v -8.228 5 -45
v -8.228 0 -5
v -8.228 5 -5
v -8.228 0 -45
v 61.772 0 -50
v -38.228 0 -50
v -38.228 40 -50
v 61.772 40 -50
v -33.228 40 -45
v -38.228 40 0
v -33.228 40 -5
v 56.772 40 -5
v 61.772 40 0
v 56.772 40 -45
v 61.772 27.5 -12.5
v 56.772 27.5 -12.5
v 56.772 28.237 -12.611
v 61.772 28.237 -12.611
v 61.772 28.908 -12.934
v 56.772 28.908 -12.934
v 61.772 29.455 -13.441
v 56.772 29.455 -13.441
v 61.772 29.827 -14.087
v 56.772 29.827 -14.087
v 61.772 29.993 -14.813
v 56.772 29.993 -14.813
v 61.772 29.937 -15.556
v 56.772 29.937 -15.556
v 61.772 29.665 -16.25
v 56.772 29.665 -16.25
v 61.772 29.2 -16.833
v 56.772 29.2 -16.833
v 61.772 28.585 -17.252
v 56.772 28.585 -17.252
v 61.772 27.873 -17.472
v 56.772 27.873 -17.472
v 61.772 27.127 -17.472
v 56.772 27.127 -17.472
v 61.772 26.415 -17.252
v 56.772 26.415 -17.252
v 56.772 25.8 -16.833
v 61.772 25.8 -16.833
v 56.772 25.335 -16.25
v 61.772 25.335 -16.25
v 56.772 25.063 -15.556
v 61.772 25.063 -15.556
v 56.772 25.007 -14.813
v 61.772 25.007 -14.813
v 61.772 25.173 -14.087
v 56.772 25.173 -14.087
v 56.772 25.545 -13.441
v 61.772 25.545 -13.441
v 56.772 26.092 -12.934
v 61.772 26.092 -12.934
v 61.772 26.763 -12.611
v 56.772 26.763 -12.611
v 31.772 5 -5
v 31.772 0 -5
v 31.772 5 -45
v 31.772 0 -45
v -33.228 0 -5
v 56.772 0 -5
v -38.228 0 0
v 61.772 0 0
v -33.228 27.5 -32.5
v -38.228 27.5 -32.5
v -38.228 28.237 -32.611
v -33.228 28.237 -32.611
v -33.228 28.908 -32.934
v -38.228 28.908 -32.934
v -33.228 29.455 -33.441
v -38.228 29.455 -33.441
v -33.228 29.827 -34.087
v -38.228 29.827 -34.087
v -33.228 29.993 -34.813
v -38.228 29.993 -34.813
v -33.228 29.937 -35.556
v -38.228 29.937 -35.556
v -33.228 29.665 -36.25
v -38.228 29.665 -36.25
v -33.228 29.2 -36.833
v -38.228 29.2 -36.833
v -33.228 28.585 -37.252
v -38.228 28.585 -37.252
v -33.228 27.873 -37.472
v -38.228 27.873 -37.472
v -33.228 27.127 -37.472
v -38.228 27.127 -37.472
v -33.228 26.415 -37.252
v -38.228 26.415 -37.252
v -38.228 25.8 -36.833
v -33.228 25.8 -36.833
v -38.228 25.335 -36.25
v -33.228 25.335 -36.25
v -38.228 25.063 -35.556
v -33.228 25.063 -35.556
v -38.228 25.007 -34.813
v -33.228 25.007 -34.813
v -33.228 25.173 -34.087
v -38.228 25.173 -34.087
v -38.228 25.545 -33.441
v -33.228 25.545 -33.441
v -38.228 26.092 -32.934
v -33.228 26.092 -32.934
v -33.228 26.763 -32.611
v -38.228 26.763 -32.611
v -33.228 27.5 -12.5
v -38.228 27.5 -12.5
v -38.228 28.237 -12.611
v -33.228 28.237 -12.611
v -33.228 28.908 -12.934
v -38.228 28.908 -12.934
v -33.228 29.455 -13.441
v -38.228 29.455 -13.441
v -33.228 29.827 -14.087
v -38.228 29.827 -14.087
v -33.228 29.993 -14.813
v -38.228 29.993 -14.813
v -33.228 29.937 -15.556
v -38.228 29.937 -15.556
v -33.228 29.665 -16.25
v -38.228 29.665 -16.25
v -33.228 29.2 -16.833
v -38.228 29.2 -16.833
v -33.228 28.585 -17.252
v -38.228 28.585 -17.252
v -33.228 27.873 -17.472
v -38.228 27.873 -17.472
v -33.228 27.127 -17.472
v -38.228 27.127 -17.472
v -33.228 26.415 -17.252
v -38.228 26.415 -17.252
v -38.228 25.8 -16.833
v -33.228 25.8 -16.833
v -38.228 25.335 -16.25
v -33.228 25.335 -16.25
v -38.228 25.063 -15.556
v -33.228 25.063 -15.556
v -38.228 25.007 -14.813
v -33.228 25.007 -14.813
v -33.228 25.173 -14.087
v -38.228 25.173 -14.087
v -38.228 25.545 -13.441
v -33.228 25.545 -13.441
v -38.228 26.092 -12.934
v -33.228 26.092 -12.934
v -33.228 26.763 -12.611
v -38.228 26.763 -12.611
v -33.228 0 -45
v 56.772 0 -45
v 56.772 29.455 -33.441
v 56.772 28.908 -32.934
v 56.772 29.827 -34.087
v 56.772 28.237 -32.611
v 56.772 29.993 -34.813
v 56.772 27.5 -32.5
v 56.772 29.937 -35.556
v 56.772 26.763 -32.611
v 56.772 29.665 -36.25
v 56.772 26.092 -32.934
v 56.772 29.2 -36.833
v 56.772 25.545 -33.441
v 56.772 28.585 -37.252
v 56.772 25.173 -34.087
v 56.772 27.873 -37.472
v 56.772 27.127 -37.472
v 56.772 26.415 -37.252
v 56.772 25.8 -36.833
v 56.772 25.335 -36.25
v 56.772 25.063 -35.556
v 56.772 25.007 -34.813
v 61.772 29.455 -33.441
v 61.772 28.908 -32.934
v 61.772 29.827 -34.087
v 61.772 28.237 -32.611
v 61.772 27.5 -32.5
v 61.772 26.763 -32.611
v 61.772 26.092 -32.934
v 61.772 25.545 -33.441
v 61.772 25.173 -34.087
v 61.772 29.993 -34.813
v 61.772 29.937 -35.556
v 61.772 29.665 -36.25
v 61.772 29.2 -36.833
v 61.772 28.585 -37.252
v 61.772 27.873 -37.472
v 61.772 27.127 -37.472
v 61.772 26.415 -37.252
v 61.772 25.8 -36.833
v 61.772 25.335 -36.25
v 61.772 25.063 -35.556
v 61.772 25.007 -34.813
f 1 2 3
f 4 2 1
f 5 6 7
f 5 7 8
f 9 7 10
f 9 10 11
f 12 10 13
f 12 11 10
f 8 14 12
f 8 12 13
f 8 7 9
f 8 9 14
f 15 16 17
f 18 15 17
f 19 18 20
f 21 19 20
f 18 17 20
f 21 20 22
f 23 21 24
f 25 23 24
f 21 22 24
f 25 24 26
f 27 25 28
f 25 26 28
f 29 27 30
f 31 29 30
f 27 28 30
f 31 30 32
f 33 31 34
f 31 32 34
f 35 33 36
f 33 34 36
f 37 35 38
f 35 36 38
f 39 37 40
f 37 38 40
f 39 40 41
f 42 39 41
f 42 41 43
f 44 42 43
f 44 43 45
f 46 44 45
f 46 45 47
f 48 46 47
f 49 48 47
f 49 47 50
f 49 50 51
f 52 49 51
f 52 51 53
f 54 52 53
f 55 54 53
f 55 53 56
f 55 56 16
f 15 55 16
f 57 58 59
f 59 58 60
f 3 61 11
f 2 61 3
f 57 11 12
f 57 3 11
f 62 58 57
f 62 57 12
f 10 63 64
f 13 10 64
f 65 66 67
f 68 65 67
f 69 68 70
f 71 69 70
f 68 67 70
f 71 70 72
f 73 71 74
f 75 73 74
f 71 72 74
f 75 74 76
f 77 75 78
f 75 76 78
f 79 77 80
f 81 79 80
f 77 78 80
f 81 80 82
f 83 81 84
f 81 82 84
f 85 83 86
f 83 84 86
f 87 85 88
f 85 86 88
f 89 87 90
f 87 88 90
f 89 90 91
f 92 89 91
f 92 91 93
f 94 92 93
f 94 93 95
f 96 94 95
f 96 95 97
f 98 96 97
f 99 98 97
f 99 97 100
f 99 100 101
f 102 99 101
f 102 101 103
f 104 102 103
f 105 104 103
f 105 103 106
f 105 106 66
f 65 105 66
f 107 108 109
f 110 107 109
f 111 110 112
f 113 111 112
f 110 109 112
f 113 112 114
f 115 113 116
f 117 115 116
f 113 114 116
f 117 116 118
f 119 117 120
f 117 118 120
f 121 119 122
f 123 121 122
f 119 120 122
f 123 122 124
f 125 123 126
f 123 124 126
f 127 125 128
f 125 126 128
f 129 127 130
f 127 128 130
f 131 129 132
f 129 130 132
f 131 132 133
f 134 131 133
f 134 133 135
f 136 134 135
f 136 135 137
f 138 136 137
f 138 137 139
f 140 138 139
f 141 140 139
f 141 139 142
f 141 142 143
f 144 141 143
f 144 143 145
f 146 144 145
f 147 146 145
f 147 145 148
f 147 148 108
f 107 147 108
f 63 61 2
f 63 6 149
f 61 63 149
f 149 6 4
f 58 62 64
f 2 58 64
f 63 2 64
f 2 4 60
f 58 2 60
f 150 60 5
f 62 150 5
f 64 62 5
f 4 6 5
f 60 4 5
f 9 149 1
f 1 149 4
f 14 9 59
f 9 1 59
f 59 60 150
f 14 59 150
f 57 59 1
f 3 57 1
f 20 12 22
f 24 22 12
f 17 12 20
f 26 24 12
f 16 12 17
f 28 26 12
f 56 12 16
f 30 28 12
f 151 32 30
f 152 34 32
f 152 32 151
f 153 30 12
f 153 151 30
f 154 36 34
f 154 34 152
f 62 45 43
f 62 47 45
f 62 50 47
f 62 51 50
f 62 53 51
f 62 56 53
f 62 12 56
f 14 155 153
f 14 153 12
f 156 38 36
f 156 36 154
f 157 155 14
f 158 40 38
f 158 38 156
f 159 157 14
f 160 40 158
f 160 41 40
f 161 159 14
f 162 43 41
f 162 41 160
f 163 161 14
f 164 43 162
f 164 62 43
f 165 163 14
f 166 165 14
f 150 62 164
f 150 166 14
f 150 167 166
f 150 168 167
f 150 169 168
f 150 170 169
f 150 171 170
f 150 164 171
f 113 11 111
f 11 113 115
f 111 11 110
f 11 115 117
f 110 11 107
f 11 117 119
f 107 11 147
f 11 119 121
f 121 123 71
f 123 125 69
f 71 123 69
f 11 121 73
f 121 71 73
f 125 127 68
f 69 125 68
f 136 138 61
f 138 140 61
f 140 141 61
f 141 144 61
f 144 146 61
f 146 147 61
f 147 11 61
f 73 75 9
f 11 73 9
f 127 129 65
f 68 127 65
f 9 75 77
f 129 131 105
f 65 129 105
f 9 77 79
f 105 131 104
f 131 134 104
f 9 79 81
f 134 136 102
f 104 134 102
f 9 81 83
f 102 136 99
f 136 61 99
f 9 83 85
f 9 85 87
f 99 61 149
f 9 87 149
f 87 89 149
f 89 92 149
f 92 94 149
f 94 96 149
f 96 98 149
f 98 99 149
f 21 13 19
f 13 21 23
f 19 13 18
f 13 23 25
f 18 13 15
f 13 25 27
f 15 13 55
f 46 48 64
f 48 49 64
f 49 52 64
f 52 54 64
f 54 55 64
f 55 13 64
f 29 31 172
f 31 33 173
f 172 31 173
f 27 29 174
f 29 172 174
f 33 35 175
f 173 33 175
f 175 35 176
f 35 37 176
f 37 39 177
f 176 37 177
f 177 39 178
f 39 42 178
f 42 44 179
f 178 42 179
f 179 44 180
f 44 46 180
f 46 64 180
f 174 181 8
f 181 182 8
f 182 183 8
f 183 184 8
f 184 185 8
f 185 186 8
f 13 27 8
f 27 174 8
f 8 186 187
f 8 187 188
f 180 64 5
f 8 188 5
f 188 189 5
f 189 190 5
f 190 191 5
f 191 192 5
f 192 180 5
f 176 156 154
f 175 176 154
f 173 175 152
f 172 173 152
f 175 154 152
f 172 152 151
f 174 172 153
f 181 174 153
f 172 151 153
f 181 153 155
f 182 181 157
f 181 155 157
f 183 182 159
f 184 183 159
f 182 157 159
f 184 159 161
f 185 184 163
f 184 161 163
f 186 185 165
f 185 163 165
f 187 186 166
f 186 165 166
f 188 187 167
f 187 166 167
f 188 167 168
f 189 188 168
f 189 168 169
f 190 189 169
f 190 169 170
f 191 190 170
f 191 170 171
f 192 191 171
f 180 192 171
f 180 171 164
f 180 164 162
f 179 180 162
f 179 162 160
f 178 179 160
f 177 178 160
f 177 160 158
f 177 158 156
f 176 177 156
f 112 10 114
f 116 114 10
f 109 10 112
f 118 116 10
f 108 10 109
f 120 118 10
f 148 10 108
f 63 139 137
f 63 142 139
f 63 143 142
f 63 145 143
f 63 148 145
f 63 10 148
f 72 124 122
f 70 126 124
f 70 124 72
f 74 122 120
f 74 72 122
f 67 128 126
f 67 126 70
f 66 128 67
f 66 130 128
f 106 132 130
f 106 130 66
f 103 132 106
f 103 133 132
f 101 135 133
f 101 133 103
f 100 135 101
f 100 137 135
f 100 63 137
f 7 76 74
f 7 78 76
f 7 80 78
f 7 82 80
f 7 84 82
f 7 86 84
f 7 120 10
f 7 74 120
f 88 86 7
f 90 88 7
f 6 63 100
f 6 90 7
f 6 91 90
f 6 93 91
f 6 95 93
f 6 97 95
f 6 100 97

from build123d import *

# Parameters (mm, degrees)
SKETCH1_W           = 100
SKETCH1_H           = 50
SKETCH1_W_2         = 90
SKETCH1_H_2         = 40
BOSS_EXTRUDE1_DEPTH = 40
SKETCH3_W           = 40
SKETCH3_H           = 40
BOSS_EXTRUDE2_DEPTH = 5
SKETCH4_R           = 2.5
CUT_EXTRUDE1_DEPTH  = 116


with BuildPart() as part:
    # Sketch1 → Boss-Extrude1 (new body)
    with BuildSketch(Plane(origin=(0, 0, 0), x_dir=(1, 0, 0), z_dir=(0, 1, 0))):
        with Locations((11.771561772, 25)):
            Rectangle(SKETCH1_W, SKETCH1_H)
        with Locations((11.771561772, 25)):
            Rectangle(SKETCH1_W_2, SKETCH1_H_2, mode=Mode.SUBTRACT)
    extrude(amount=BOSS_EXTRUDE1_DEPTH)

    # Sketch3 → Boss-Extrude2 (add)
    with BuildSketch(Plane(origin=(0, 0, 0), x_dir=(-1, 0, 0), z_dir=(0, -1, 0))):
        with Locations((-11.771561772, 25)):
            Rectangle(SKETCH3_W, SKETCH3_H)
    extrude(amount=-BOSS_EXTRUDE2_DEPTH)

    # Sketch4 → Cut-Extrude1 (cut)
    with BuildSketch(Plane.ZY.offset(38.228438228)):
        with Locations((-35, 27.5)):
            Circle(SKETCH4_R)
        with Locations((-15, 27.5)):
            Circle(SKETCH4_R)
    extrude(amount=-CUT_EXTRUDE1_DEPTH, mode=Mode.SUBTRACT)


solid = part.part
